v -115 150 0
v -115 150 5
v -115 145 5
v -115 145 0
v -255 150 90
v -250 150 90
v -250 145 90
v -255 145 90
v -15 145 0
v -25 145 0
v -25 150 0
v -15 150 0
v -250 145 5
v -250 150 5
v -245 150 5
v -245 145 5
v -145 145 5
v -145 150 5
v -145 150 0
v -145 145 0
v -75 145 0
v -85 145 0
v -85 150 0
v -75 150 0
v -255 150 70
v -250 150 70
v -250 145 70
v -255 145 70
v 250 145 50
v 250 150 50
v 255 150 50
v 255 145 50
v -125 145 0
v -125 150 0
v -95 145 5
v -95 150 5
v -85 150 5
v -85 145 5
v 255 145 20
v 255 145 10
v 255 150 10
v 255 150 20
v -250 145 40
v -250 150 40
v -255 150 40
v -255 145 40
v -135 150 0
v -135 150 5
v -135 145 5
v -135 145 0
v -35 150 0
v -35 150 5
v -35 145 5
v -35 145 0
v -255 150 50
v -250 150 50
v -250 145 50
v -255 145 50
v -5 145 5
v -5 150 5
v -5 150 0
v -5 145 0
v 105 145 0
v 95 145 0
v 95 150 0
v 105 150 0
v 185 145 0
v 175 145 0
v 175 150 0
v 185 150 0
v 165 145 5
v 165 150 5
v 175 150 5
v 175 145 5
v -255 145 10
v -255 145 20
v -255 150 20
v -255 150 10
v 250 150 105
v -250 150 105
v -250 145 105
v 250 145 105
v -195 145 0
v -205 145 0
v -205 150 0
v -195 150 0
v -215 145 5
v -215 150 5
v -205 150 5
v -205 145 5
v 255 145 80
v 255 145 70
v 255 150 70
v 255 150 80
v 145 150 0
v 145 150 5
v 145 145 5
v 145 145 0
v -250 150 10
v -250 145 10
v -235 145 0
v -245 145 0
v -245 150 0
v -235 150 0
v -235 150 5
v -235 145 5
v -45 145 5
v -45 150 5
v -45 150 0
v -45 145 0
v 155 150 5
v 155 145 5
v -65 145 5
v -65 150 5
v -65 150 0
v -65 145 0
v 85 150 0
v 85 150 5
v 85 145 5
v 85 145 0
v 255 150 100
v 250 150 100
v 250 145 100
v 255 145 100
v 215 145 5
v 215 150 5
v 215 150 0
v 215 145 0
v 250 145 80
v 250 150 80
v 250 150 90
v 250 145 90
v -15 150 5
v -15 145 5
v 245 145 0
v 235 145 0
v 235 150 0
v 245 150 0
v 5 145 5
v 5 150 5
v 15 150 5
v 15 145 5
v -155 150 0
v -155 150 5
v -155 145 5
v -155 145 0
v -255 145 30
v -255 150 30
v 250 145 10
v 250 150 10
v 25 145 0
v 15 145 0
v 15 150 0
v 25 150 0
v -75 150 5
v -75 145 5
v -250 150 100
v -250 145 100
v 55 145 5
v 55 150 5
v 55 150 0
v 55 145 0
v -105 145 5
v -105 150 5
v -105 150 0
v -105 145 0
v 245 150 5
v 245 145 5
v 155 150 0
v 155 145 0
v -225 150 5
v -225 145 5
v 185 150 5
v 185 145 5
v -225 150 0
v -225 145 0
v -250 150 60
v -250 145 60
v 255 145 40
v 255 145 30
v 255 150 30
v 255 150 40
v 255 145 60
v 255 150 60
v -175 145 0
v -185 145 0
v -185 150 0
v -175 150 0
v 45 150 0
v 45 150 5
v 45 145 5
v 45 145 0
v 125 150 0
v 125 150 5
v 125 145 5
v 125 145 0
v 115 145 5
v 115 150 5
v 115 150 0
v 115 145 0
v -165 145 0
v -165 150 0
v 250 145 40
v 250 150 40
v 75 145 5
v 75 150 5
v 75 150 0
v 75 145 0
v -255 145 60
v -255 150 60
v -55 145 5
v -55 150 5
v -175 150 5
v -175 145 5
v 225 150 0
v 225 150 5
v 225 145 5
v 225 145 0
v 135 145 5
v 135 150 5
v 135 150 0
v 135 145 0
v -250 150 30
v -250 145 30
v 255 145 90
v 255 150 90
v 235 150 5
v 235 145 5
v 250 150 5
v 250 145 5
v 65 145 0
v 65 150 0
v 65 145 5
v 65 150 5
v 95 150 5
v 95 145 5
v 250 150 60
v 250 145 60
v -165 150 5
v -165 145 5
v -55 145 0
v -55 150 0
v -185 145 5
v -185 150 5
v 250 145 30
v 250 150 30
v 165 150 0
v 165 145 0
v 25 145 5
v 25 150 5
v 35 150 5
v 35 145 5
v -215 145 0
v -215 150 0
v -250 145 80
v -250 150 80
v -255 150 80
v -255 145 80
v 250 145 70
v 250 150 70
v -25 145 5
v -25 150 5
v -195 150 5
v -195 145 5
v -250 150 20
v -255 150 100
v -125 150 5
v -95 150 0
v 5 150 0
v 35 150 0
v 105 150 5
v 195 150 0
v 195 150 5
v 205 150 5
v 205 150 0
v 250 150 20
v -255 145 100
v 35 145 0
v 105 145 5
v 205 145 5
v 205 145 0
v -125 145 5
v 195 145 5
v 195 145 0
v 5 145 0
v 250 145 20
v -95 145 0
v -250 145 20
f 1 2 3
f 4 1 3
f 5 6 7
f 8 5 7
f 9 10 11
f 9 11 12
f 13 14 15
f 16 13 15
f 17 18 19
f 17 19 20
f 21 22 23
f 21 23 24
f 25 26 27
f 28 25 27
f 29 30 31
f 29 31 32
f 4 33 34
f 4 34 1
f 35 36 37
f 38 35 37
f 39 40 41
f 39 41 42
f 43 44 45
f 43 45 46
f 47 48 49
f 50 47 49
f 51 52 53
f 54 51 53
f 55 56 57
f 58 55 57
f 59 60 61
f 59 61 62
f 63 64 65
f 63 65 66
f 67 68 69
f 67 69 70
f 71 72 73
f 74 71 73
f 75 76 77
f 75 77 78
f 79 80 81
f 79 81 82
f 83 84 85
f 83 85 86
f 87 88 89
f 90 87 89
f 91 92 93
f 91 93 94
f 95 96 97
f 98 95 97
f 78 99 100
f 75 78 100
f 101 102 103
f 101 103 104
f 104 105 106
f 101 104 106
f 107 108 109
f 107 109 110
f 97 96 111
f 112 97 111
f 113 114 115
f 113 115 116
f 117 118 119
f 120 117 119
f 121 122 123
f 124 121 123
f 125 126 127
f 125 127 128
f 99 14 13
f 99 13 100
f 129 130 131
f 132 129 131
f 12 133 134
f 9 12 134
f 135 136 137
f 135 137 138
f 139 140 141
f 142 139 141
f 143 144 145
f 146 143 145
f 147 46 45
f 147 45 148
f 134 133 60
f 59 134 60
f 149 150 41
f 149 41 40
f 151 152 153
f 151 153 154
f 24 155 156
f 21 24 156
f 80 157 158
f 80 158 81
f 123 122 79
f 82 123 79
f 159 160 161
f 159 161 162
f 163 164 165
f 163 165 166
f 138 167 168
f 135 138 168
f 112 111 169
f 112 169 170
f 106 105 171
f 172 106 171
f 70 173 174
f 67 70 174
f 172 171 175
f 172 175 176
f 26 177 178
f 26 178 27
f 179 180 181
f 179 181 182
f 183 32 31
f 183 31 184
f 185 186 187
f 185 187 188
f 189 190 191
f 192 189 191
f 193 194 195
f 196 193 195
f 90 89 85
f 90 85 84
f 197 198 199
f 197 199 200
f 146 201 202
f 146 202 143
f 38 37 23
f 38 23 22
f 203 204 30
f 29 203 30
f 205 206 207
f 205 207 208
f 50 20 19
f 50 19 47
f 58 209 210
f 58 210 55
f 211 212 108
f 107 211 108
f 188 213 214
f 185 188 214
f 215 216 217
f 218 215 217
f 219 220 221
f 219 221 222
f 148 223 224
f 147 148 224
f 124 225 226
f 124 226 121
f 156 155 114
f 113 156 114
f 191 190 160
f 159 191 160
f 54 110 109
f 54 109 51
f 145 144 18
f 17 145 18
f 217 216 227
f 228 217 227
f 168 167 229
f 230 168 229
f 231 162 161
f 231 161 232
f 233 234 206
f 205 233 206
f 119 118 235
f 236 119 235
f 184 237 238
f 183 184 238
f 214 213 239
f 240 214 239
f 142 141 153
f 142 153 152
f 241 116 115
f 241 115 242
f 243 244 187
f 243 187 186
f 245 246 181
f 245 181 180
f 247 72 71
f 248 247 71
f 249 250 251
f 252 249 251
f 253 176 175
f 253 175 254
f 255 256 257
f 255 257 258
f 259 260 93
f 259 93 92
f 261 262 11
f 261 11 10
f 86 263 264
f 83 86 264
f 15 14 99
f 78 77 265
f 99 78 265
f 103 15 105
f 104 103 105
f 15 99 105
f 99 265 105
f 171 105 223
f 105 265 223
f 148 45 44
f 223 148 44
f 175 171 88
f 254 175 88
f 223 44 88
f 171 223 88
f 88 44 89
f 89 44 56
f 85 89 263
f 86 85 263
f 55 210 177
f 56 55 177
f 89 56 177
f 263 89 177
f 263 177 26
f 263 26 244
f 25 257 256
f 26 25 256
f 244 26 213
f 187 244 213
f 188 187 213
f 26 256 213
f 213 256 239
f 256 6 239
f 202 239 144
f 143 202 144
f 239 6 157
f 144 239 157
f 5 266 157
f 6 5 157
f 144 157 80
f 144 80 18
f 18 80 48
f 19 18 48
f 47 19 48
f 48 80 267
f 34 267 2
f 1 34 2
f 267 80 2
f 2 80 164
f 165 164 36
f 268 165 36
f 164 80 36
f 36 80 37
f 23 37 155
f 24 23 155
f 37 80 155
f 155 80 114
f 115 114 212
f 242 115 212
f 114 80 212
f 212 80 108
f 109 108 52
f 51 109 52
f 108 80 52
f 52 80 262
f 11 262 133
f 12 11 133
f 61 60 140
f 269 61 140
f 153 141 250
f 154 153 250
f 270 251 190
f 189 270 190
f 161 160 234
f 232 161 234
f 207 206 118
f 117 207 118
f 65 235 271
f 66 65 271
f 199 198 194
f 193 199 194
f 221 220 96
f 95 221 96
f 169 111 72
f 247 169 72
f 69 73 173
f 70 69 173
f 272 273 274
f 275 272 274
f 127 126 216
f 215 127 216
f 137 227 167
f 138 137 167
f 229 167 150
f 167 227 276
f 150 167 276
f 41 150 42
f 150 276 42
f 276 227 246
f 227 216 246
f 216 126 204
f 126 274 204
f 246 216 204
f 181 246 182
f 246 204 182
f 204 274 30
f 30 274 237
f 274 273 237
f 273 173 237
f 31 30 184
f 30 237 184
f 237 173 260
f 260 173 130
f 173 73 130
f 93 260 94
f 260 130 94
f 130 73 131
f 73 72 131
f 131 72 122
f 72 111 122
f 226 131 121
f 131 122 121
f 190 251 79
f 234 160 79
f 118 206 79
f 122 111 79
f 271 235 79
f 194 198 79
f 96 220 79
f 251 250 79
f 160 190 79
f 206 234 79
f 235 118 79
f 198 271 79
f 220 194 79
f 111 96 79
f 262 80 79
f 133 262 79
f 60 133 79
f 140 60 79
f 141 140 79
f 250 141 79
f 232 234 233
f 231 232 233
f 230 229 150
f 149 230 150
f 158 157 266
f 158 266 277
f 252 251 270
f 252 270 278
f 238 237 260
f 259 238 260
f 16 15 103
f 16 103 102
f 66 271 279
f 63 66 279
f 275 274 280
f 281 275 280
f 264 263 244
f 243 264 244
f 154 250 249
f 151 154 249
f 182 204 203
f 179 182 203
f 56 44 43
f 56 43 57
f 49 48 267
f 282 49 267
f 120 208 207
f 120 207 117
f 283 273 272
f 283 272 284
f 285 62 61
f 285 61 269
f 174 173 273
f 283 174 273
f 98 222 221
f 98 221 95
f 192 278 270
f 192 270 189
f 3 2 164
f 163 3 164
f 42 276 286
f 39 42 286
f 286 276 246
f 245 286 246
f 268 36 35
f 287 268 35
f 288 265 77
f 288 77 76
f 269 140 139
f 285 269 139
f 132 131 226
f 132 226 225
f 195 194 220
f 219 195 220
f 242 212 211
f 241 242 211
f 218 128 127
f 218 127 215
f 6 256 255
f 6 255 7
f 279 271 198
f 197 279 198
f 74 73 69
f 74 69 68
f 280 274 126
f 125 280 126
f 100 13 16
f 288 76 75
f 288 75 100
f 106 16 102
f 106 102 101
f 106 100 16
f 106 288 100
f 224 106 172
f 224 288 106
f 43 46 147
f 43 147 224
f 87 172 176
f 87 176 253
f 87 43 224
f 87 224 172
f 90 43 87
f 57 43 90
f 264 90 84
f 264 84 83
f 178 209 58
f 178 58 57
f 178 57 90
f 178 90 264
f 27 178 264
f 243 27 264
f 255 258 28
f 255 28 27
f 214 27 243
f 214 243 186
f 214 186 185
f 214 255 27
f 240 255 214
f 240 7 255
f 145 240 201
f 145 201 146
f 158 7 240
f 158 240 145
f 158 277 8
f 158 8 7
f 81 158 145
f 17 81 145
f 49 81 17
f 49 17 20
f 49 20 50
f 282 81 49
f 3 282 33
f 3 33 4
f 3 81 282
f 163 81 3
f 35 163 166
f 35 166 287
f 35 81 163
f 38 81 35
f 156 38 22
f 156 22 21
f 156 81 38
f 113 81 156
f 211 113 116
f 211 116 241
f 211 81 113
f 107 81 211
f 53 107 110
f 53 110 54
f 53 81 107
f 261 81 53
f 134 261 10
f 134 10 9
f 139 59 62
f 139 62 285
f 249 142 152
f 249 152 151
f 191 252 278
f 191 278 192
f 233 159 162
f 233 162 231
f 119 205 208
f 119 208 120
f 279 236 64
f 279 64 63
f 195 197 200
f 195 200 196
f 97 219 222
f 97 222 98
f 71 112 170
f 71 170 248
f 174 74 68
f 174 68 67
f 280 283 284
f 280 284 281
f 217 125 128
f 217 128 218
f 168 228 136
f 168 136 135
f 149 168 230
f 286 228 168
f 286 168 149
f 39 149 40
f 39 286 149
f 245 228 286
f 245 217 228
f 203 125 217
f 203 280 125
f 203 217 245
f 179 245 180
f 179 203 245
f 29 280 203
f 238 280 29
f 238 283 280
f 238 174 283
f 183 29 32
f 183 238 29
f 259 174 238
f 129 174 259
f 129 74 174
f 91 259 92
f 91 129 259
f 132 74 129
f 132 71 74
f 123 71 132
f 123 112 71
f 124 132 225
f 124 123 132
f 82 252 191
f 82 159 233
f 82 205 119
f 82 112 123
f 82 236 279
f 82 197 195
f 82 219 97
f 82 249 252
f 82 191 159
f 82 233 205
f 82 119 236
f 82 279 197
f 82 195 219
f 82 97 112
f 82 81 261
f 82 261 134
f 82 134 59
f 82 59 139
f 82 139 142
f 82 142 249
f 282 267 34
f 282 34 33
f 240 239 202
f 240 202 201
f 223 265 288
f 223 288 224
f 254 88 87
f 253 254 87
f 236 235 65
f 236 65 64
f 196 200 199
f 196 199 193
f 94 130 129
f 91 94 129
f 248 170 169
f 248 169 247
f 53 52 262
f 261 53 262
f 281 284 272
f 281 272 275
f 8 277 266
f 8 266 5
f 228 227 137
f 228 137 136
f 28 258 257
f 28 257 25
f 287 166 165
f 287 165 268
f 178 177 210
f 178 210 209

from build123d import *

# Parameters (mm, degrees)
SKETCH001_W             = 500
SKETCH001_H             = 100
PAD001_DEPTH            = 5
SKETCH022_W             = 10
SKETCH022_H             = 5
PAD020_DEPTH            = 5
LINEARPATTERN002_COUNT  = 25
LINEARPATTERN002_PITCH  = 20
SKETCH023_W             = 10
SKETCH023_H             = 5
PAD021_DEPTH            = 5
LINEARPATTERN003_COUNT  = 5
LINEARPATTERN003_PITCH  = 20
SKETCH024_W             = 10
SKETCH024_H             = 5
PAD022_DEPTH            = 5
LINEARPATTERN004_COUNT  = 5
LINEARPATTERN004_PITCH  = 20
BODY001_PLACEMENT_ANGLE = 90


with BuildPart() as part:
    # Sketch001 → Pad001 (new body)
    with BuildSketch(Plane.XY):
        Rectangle(SKETCH001_W, SKETCH001_H)
    extrude(amount=PAD001_DEPTH)

    # Sketch022 (on DatumPlane) → Pad020 (join)
    with BuildSketch(Plane.XZ.offset(50)):
        with Locations((-240, 2.5)):
            Rectangle(SKETCH022_W, SKETCH022_H)
    pad020 = extrude(amount=PAD020_DEPTH)

    # LinearPattern002: Pad020 ×25
    with Locations(*[(i * LINEARPATTERN002_PITCH, 0, 0) for i in range(1, LINEARPATTERN002_COUNT)]):
        add(pad020)

    # Sketch023 (on DatumPlane) → Pad021 (join)
    with BuildSketch(Plane.YZ.offset(250)):
        with Locations((-40, 2.5)):
            Rectangle(SKETCH023_W, SKETCH023_H)
    pad021 = extrude(amount=PAD021_DEPTH)

    # LinearPattern003: Pad021 ×5
    with Locations(*[(0, i * LINEARPATTERN003_PITCH, 0) for i in range(1, LINEARPATTERN003_COUNT)]):
        add(pad021)

    # Sketch024 (on DatumPlane) → Pad022 (join)
    with BuildSketch(Plane(origin=(-250, 0, 0), x_dir=(0, -1, 0), z_dir=(-1, 0, 0))):
        with Locations((-40, 2.5)):
            Rectangle(SKETCH024_W, SKETCH024_H)
    pad022 = extrude(amount=PAD022_DEPTH)

    # LinearPattern004: Pad022 ×5
    with Locations(*[(0, -i * LINEARPATTERN004_PITCH, 0) for i in range(1, LINEARPATTERN004_COUNT)]):
        add(pad022)


with BuildPart() as part_1:
    # Body001 placement: moved
    add(part.part.moved(Location((0, 150, 55))).rotate(Axis((0, 150, 55), (1, 0, 0)), BODY001_PLACEMENT_ANGLE))


solid = part_1.part
